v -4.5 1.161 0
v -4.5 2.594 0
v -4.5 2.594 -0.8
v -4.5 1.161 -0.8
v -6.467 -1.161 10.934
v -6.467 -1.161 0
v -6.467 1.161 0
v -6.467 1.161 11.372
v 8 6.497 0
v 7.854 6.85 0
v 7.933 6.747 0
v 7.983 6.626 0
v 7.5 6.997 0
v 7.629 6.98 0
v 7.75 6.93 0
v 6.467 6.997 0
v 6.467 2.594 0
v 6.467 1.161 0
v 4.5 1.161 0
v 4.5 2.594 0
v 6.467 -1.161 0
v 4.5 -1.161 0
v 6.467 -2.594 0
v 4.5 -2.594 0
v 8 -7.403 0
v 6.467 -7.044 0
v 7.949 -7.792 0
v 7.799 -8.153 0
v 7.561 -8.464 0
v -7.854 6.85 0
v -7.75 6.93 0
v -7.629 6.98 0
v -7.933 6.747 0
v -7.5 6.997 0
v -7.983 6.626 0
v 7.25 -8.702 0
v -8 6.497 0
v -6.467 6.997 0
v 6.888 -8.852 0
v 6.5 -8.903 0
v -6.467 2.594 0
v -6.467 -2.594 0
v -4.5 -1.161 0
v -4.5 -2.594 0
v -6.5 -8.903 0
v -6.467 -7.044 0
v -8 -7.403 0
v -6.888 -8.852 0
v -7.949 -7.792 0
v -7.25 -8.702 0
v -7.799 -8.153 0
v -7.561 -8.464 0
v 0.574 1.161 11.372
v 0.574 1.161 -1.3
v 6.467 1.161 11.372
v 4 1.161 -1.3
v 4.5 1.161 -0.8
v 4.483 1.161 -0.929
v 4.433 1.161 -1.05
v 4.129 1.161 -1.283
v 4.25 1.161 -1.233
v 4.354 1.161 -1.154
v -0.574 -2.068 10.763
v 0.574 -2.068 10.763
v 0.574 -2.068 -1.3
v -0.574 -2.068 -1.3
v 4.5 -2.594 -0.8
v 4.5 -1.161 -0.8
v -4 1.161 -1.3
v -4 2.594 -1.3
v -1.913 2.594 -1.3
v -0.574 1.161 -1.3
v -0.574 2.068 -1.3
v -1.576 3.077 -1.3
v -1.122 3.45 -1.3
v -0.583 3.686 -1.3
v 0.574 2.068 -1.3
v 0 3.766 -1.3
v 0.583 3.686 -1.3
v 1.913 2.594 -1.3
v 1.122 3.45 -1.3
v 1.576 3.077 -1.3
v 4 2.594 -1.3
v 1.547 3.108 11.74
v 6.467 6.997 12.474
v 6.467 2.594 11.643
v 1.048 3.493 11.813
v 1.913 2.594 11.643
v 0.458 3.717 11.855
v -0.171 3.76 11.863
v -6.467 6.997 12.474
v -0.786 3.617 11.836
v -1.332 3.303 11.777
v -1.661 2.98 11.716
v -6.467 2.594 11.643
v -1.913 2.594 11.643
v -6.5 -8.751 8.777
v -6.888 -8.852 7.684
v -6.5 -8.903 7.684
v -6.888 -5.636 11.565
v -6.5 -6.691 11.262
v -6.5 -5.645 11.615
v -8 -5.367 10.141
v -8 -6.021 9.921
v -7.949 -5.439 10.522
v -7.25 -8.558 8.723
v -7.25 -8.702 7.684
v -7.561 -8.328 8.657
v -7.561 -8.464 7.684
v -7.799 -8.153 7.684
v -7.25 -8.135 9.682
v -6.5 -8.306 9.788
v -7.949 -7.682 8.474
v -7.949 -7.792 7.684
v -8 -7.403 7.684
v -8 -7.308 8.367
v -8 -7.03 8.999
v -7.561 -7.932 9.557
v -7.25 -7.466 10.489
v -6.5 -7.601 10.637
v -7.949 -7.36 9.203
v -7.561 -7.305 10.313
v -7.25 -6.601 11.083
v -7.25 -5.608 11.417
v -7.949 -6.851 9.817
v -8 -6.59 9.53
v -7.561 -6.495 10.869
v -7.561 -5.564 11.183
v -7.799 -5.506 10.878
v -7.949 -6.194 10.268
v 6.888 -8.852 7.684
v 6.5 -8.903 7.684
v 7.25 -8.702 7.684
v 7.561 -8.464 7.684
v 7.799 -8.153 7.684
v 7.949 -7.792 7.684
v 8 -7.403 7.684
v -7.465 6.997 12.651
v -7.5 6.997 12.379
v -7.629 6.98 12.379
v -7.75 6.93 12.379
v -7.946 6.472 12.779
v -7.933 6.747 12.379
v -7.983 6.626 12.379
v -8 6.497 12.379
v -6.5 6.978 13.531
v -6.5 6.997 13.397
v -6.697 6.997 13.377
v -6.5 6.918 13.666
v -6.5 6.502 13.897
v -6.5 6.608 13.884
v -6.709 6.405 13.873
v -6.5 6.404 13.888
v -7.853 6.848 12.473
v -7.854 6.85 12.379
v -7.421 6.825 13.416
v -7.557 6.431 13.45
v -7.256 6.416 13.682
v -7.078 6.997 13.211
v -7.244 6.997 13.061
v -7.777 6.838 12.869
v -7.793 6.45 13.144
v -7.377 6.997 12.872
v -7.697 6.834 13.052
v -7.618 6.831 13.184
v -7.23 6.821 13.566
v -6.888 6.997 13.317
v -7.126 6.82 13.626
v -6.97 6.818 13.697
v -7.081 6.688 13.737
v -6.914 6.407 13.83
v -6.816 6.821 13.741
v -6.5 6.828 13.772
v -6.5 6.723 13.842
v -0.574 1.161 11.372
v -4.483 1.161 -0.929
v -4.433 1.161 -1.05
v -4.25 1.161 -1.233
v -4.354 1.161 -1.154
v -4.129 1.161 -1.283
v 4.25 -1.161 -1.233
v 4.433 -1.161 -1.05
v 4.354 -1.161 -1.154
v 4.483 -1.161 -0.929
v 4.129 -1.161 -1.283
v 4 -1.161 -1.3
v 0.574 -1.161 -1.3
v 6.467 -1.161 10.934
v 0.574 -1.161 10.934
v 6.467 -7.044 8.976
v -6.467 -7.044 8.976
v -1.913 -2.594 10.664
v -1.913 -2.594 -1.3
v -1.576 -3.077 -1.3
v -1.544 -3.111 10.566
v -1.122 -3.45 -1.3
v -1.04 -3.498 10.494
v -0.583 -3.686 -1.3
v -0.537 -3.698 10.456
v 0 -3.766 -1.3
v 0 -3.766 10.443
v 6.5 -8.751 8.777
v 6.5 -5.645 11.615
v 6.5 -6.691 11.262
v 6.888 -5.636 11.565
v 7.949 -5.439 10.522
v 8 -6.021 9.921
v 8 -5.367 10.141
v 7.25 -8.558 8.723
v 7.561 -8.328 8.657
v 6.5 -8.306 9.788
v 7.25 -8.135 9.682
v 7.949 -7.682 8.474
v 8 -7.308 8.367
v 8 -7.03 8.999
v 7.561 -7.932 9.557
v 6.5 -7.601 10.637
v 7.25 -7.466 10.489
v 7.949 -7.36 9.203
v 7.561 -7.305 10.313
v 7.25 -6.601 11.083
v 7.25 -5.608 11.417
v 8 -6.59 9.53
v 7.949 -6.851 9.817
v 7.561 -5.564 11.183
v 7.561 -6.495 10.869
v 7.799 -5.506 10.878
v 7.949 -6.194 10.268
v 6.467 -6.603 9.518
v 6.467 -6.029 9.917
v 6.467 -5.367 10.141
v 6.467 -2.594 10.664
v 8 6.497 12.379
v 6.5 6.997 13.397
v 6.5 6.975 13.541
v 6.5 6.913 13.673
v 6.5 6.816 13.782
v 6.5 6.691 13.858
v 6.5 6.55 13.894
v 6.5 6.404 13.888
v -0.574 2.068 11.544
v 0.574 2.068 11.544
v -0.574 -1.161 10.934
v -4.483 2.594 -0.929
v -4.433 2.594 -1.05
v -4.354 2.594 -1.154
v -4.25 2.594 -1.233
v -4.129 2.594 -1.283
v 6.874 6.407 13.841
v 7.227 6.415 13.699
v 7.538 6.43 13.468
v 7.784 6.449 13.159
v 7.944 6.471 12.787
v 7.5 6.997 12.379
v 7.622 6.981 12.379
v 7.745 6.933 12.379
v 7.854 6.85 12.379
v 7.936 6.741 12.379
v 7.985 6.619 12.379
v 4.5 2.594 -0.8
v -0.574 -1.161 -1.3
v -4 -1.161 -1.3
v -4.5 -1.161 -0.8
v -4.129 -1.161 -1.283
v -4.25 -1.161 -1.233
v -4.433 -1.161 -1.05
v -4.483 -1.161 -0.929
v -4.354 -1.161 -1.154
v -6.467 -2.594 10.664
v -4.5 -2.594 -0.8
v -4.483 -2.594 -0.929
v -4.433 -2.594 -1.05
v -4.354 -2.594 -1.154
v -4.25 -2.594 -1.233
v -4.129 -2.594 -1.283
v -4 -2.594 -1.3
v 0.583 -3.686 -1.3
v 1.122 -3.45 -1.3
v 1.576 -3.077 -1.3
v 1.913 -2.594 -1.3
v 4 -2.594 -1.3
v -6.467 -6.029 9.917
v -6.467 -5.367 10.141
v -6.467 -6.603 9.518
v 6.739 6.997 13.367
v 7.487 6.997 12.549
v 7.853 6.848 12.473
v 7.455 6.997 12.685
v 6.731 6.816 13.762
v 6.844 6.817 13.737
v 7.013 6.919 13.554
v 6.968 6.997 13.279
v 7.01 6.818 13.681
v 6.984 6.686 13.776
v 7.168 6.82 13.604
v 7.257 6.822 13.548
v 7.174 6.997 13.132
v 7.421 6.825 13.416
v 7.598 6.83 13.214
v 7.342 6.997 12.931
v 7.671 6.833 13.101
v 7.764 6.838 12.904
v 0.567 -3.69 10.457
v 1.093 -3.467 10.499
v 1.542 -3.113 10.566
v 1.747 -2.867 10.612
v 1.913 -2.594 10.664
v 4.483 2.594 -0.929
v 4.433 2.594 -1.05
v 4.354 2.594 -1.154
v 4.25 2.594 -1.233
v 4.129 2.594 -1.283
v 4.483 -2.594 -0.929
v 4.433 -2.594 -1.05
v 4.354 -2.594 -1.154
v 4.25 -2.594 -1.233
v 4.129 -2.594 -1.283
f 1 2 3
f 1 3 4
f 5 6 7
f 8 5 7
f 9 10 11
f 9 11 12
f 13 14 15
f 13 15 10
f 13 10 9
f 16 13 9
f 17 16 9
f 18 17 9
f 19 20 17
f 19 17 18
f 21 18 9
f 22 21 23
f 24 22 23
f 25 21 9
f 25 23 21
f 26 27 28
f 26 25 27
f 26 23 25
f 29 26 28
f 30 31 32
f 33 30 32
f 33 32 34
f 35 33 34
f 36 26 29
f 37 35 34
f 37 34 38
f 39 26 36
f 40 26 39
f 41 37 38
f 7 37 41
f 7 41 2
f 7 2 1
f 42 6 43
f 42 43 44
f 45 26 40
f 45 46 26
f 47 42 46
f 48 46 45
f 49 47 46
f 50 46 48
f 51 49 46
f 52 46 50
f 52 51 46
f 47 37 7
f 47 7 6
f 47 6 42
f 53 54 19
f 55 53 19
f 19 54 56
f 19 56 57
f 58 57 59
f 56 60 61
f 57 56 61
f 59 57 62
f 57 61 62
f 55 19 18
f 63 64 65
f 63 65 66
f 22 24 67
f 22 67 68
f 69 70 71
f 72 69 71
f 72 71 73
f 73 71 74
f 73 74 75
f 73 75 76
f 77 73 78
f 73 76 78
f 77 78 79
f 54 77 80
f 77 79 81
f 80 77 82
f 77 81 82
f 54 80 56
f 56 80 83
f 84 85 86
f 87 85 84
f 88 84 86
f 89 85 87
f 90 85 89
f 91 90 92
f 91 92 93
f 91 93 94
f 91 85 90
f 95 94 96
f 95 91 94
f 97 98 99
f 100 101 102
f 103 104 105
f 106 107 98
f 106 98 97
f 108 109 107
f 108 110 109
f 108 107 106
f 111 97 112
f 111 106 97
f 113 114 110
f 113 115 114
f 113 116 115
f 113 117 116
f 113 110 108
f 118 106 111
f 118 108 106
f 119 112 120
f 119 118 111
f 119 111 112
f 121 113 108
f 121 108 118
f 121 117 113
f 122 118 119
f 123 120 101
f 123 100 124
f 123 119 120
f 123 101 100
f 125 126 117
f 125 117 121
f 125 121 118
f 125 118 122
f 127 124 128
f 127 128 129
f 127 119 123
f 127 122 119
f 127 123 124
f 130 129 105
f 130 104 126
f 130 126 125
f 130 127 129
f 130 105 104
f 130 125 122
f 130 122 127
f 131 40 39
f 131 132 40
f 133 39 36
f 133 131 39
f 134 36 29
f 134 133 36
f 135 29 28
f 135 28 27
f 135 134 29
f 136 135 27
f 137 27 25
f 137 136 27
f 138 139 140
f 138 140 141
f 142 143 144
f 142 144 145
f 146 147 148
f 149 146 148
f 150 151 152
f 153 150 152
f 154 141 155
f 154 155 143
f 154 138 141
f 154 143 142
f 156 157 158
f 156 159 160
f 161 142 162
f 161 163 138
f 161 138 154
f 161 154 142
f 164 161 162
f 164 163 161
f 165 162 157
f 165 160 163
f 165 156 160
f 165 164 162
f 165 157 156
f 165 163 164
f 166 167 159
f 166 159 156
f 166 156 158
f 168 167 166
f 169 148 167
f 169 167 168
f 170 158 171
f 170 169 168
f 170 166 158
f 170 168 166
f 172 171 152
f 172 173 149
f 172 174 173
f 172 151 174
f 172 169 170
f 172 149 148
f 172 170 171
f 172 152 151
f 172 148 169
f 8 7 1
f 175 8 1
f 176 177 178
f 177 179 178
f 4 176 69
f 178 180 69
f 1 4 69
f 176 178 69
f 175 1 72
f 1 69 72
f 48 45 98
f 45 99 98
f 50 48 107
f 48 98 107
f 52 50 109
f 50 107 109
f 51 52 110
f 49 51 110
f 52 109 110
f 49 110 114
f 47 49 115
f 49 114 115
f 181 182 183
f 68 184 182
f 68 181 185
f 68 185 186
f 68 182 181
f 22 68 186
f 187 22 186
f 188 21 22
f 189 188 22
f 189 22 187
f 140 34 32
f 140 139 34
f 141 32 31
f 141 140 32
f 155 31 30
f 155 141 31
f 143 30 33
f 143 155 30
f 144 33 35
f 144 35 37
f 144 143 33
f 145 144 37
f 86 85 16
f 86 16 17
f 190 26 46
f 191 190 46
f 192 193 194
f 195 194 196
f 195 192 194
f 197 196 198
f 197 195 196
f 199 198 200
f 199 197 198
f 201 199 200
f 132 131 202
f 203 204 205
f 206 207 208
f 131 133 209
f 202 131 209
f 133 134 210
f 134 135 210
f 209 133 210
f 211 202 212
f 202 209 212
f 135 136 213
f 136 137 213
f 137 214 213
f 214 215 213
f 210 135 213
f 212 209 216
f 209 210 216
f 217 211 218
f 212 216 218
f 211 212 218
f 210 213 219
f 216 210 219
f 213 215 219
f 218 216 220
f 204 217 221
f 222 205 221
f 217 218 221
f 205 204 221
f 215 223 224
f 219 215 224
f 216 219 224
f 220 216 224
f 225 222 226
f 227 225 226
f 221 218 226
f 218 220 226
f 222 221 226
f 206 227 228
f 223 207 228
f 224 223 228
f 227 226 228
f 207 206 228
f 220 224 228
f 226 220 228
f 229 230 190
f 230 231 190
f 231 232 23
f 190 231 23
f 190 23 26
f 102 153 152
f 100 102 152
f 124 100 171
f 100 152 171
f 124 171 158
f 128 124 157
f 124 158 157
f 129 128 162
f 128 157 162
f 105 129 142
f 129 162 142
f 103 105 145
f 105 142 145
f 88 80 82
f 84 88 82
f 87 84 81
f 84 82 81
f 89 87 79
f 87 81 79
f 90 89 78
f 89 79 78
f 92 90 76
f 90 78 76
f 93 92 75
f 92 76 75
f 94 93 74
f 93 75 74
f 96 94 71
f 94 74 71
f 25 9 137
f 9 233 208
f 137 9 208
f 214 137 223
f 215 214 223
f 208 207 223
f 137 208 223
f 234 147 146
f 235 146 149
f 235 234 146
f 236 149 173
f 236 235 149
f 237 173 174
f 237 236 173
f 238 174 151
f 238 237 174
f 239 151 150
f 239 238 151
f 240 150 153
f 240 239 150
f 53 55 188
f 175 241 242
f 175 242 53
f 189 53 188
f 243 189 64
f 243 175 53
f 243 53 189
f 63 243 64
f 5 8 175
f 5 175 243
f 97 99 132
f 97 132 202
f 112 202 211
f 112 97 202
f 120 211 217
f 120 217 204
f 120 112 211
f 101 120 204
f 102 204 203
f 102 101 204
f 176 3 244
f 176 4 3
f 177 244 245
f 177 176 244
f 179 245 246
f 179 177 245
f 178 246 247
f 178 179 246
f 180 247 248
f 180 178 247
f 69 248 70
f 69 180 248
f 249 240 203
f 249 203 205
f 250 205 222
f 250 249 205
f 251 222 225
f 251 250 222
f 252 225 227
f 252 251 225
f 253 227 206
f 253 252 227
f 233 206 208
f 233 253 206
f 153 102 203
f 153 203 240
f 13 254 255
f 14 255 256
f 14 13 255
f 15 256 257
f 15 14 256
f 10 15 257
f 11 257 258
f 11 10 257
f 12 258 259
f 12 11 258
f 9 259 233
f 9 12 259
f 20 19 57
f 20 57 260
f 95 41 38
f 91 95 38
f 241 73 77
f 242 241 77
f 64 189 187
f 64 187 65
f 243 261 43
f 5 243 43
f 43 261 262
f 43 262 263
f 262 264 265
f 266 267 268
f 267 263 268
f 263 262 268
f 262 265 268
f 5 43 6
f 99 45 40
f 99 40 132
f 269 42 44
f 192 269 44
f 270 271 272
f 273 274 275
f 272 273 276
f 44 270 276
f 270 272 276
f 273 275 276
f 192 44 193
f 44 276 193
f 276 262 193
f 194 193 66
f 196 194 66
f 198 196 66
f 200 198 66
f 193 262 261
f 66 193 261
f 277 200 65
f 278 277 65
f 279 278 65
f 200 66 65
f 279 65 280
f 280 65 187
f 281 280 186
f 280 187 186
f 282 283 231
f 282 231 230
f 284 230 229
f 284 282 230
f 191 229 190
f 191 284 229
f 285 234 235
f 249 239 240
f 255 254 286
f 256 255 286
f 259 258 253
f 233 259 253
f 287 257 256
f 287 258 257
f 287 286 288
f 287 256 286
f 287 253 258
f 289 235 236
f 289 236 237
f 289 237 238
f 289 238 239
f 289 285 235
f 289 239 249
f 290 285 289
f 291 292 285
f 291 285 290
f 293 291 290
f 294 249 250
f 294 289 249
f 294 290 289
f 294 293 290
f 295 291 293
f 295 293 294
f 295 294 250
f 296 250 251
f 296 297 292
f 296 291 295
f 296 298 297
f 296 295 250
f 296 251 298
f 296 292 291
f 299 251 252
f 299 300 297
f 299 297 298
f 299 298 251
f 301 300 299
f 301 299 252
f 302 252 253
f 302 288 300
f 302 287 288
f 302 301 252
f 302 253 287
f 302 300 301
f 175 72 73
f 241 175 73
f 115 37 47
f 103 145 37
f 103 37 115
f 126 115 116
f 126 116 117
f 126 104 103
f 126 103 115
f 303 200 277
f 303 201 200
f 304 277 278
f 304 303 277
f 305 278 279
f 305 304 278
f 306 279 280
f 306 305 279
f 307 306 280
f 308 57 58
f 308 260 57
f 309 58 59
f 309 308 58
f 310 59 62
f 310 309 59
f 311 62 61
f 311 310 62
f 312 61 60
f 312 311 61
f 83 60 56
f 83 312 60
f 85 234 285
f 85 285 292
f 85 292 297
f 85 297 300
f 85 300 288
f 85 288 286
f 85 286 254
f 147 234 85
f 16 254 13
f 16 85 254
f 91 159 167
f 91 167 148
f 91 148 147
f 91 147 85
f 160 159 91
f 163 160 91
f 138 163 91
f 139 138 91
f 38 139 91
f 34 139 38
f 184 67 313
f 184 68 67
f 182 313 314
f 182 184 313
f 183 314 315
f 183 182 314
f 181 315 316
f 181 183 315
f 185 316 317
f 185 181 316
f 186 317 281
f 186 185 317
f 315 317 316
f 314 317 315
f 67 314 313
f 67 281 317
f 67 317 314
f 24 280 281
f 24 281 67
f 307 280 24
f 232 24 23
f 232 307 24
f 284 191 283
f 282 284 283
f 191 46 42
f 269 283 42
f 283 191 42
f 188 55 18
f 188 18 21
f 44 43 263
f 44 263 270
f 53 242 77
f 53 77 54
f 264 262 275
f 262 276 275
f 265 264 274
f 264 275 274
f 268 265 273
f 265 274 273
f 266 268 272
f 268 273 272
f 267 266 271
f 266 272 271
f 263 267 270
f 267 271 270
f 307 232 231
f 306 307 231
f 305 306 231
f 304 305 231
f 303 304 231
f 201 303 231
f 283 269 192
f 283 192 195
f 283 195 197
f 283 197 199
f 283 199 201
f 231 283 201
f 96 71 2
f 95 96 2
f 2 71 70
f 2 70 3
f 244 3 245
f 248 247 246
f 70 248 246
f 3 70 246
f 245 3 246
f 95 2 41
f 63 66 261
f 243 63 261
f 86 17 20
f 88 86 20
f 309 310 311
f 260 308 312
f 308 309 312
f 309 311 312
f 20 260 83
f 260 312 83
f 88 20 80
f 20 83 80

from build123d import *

# Parameters (mm, degrees)
F1_DEPTH = 14
F3_DEPTH = 16
F4_DEPTH = 16
F5_R     = 1.5
F6_DEPTH = 1.3
F7_R     = 0.5


with BuildPart() as f1:
    # F0 (on Top) → F1 (new body)
    with BuildSketch(Plane.XY):
        Polygon((6.4673761603, 1.1610865705), (6.4673761603, -1.1610865705), (4.5, -1.1610865705), (4.5, -2.5941354688), (6.4673761603, -2.5941354688), (6.4673761603, -7.0438799448), (0, -7.0438799448), (-6.4673761603, -7.0438799448), (-6.4673761603, -2.5941354688), (-4.5, -2.5941354688), (-4.5, -1.1610865705), (-6.4673761603, -1.1610865705), (-6.4673761603, 1.1610865705), (-4.5, 1.1610865705), (-4.5, 2.5941354688), (-6.4673761603, 2.5941354688), (-6.4673761603, 6.996571178), (-8, 6.996571178), (-8, -8.903428822), (8, -8.903428822), (8, 6.996571178), (6.4673761603, 6.996571178), (6.4673761603, 2.5941354688), (4.5, 2.5941354688), (4.5, 1.1610865705), align=None)
        with BuildLine():
            Line((0.5740744527, 1.1610865705), (4.5, 1.1610865705))
            Line((4.5, 1.1610865705), (4.5, 2.5941354688))
            Line((4.5, 2.5941354688), (1.9127666601, 2.5941354688))
            ThreePointArc((1.9127666601, 2.5941354688), (0, 3.7664402702), (-1.9127666601, 2.5941354688))
            Line((-1.9127666601, 2.5941354688), (-4.5, 2.5941354688))
            Line((-4.5, 2.5941354688), (-4.5, 1.1610865705))
            Line((-4.5, 1.1610865705), (-0.5740744527, 1.1610865705))
            Line((-0.5740744527, 1.1610865705), (-0.5740744527, 2.0683966577))
            Line((-0.5740744527, 2.0683966577), (0.5740744527, 2.0683966577))
            Line((0.5740744527, 2.0683966577), (0.5740744527, 1.1610865705))
        make_face()
        with BuildLine():
            Line((4.5, -2.5941354688), (4.5, -1.1610865705))
            Line((4.5, -1.1610865705), (0.5740744527, -1.1610865705))
            Line((0.5740744527, -1.1610865705), (0.5740744527, -2.0683966577))
            Line((0.5740744527, -2.0683966577), (-0.5740744527, -2.0683966577))
            Line((-0.5740744527, -2.0683966577), (-0.5740744527, -1.1610865705))
            Line((-0.5740744527, -1.1610865705), (-4.5, -1.1610865705))
            Line((-4.5, -1.1610865705), (-4.5, -2.5941354688))
            Line((-4.5, -2.5941354688), (-1.9127666601, -2.5941354688))
            ThreePointArc((-1.9127666601, -2.5941354688), (-1.1217146299, -3.4500472339), (0, -3.7664402702))
            ThreePointArc((0, -3.7664402702), (1.1217146299, -3.4500472339), (1.9127666601, -2.5941354688))
            Line((1.9127666601, -2.5941354688), (4.5, -2.5941354688))
        make_face()
    extrude(amount=F1_DEPTH)

    # F2 (on face) → F3 (intersect, through all)
    with BuildSketch(Plane(origin=(-8, 0, 0), x_dir=(0, -1, 0), z_dir=(-1, 0, 0))):
        with BuildLine():
            Line((5.36694847, 10.1407940407), (-6.996571178, 12.473533597))
            Line((-6.996571178, 12.473533597), (-6.996571178, 0))
            Line((-6.996571178, 0), (7.403428822, 0))
            Line((7.403428822, 0), (7.403428822, 7.6841399064))
            ThreePointArc((7.403428822, 7.6841399064), (6.8281104996, 9.2796336983), (5.36694847, 10.1407940407))
        make_face()
    extrude(amount=-F3_DEPTH, mode=Mode.INTERSECT)

    # F2 (on face) → F4 (join, through all)
    with BuildSketch(Plane(origin=(-8, 0, 0), x_dir=(0, -1, 0), z_dir=(-1, 0, 0))):
        with BuildLine():
            Line((5.6450602588, 11.6147865214), (-6.996571178, 14))
            Line((-6.996571178, 14), (-6.996571178, 12.473533597))
            Line((-6.996571178, 12.473533597), (5.36694847, 10.1407940407))
            ThreePointArc((5.36694847, 10.1407940407), (6.8281104996, 9.2796336983), (7.403428822, 7.6841399064))
            Line((7.403428822, 7.6841399064), (7.403428822, 0))
            Line((7.403428822, 0), (8.903428822, 0))
            Line((8.903428822, 0), (8.903428822, 7.6841399064))
            ThreePointArc((8.903428822, 7.6841399064), (7.9829195061, 10.2369299734), (5.6450602588, 11.6147865214))
        make_face()
    extrude(amount=-F4_DEPTH)

    # F5
    f5_edges = [f1.edges().sort_by_distance(p)[0] for p in [
        (-8, 0.675755, 12.807393),
        (8, 0.675755, 12.807393),
    ]]
    fillet(f5_edges, radius=F5_R)

    # F0 (on Top) → F6 (join)
    with BuildSketch(Plane.XY):
        with BuildLine():
            Line((4.5, -2.5941354688), (4.5, -1.1610865705))
            Line((4.5, -1.1610865705), (0.5740744527, -1.1610865705))
            Line((0.5740744527, -1.1610865705), (0.5740744527, -2.0683966577))
            Line((0.5740744527, -2.0683966577), (-0.5740744527, -2.0683966577))
            Line((-0.5740744527, -2.0683966577), (-0.5740744527, -1.1610865705))
            Line((-0.5740744527, -1.1610865705), (-4.5, -1.1610865705))
            Line((-4.5, -1.1610865705), (-4.5, -2.5941354688))
            Line((-4.5, -2.5941354688), (-1.9127666601, -2.5941354688))
            ThreePointArc((-1.9127666601, -2.5941354688), (-1.1217146299, -3.4500472339), (0, -3.7664402702))
            ThreePointArc((0, -3.7664402702), (1.1217146299, -3.4500472339), (1.9127666601, -2.5941354688))
            Line((1.9127666601, -2.5941354688), (4.5, -2.5941354688))
        make_face()
        with BuildLine():
            Line((0.5740744527, 1.1610865705), (4.5, 1.1610865705))
            Line((4.5, 1.1610865705), (4.5, 2.5941354688))
            Line((4.5, 2.5941354688), (1.9127666601, 2.5941354688))
            ThreePointArc((1.9127666601, 2.5941354688), (0, 3.7664402702), (-1.9127666601, 2.5941354688))
            Line((-1.9127666601, 2.5941354688), (-4.5, 2.5941354688))
            Line((-4.5, 2.5941354688), (-4.5, 1.1610865705))
            Line((-4.5, 1.1610865705), (-0.5740744527, 1.1610865705))
            Line((-0.5740744527, 1.1610865705), (-0.5740744527, 2.0683966577))
            Line((-0.5740744527, 2.0683966577), (0.5740744527, 2.0683966577))
            Line((0.5740744527, 2.0683966577), (0.5740744527, 1.1610865705))
        make_face()
    extrude(amount=-F6_DEPTH)

    # F7
    f7_edges = [f1.edges().sort_by_distance(p)[0] for p in [
        (-4.5, -1.877611, -1.3),
        (-4.5, 1.877611, -1.3),
        (4.5, -1.877611, -1.3),
        (4.5, 1.877611, -1.3),
        (0, 6.996571, 14),
    ]]
    fillet(f7_edges, radius=F7_R)


solid = f1.part
